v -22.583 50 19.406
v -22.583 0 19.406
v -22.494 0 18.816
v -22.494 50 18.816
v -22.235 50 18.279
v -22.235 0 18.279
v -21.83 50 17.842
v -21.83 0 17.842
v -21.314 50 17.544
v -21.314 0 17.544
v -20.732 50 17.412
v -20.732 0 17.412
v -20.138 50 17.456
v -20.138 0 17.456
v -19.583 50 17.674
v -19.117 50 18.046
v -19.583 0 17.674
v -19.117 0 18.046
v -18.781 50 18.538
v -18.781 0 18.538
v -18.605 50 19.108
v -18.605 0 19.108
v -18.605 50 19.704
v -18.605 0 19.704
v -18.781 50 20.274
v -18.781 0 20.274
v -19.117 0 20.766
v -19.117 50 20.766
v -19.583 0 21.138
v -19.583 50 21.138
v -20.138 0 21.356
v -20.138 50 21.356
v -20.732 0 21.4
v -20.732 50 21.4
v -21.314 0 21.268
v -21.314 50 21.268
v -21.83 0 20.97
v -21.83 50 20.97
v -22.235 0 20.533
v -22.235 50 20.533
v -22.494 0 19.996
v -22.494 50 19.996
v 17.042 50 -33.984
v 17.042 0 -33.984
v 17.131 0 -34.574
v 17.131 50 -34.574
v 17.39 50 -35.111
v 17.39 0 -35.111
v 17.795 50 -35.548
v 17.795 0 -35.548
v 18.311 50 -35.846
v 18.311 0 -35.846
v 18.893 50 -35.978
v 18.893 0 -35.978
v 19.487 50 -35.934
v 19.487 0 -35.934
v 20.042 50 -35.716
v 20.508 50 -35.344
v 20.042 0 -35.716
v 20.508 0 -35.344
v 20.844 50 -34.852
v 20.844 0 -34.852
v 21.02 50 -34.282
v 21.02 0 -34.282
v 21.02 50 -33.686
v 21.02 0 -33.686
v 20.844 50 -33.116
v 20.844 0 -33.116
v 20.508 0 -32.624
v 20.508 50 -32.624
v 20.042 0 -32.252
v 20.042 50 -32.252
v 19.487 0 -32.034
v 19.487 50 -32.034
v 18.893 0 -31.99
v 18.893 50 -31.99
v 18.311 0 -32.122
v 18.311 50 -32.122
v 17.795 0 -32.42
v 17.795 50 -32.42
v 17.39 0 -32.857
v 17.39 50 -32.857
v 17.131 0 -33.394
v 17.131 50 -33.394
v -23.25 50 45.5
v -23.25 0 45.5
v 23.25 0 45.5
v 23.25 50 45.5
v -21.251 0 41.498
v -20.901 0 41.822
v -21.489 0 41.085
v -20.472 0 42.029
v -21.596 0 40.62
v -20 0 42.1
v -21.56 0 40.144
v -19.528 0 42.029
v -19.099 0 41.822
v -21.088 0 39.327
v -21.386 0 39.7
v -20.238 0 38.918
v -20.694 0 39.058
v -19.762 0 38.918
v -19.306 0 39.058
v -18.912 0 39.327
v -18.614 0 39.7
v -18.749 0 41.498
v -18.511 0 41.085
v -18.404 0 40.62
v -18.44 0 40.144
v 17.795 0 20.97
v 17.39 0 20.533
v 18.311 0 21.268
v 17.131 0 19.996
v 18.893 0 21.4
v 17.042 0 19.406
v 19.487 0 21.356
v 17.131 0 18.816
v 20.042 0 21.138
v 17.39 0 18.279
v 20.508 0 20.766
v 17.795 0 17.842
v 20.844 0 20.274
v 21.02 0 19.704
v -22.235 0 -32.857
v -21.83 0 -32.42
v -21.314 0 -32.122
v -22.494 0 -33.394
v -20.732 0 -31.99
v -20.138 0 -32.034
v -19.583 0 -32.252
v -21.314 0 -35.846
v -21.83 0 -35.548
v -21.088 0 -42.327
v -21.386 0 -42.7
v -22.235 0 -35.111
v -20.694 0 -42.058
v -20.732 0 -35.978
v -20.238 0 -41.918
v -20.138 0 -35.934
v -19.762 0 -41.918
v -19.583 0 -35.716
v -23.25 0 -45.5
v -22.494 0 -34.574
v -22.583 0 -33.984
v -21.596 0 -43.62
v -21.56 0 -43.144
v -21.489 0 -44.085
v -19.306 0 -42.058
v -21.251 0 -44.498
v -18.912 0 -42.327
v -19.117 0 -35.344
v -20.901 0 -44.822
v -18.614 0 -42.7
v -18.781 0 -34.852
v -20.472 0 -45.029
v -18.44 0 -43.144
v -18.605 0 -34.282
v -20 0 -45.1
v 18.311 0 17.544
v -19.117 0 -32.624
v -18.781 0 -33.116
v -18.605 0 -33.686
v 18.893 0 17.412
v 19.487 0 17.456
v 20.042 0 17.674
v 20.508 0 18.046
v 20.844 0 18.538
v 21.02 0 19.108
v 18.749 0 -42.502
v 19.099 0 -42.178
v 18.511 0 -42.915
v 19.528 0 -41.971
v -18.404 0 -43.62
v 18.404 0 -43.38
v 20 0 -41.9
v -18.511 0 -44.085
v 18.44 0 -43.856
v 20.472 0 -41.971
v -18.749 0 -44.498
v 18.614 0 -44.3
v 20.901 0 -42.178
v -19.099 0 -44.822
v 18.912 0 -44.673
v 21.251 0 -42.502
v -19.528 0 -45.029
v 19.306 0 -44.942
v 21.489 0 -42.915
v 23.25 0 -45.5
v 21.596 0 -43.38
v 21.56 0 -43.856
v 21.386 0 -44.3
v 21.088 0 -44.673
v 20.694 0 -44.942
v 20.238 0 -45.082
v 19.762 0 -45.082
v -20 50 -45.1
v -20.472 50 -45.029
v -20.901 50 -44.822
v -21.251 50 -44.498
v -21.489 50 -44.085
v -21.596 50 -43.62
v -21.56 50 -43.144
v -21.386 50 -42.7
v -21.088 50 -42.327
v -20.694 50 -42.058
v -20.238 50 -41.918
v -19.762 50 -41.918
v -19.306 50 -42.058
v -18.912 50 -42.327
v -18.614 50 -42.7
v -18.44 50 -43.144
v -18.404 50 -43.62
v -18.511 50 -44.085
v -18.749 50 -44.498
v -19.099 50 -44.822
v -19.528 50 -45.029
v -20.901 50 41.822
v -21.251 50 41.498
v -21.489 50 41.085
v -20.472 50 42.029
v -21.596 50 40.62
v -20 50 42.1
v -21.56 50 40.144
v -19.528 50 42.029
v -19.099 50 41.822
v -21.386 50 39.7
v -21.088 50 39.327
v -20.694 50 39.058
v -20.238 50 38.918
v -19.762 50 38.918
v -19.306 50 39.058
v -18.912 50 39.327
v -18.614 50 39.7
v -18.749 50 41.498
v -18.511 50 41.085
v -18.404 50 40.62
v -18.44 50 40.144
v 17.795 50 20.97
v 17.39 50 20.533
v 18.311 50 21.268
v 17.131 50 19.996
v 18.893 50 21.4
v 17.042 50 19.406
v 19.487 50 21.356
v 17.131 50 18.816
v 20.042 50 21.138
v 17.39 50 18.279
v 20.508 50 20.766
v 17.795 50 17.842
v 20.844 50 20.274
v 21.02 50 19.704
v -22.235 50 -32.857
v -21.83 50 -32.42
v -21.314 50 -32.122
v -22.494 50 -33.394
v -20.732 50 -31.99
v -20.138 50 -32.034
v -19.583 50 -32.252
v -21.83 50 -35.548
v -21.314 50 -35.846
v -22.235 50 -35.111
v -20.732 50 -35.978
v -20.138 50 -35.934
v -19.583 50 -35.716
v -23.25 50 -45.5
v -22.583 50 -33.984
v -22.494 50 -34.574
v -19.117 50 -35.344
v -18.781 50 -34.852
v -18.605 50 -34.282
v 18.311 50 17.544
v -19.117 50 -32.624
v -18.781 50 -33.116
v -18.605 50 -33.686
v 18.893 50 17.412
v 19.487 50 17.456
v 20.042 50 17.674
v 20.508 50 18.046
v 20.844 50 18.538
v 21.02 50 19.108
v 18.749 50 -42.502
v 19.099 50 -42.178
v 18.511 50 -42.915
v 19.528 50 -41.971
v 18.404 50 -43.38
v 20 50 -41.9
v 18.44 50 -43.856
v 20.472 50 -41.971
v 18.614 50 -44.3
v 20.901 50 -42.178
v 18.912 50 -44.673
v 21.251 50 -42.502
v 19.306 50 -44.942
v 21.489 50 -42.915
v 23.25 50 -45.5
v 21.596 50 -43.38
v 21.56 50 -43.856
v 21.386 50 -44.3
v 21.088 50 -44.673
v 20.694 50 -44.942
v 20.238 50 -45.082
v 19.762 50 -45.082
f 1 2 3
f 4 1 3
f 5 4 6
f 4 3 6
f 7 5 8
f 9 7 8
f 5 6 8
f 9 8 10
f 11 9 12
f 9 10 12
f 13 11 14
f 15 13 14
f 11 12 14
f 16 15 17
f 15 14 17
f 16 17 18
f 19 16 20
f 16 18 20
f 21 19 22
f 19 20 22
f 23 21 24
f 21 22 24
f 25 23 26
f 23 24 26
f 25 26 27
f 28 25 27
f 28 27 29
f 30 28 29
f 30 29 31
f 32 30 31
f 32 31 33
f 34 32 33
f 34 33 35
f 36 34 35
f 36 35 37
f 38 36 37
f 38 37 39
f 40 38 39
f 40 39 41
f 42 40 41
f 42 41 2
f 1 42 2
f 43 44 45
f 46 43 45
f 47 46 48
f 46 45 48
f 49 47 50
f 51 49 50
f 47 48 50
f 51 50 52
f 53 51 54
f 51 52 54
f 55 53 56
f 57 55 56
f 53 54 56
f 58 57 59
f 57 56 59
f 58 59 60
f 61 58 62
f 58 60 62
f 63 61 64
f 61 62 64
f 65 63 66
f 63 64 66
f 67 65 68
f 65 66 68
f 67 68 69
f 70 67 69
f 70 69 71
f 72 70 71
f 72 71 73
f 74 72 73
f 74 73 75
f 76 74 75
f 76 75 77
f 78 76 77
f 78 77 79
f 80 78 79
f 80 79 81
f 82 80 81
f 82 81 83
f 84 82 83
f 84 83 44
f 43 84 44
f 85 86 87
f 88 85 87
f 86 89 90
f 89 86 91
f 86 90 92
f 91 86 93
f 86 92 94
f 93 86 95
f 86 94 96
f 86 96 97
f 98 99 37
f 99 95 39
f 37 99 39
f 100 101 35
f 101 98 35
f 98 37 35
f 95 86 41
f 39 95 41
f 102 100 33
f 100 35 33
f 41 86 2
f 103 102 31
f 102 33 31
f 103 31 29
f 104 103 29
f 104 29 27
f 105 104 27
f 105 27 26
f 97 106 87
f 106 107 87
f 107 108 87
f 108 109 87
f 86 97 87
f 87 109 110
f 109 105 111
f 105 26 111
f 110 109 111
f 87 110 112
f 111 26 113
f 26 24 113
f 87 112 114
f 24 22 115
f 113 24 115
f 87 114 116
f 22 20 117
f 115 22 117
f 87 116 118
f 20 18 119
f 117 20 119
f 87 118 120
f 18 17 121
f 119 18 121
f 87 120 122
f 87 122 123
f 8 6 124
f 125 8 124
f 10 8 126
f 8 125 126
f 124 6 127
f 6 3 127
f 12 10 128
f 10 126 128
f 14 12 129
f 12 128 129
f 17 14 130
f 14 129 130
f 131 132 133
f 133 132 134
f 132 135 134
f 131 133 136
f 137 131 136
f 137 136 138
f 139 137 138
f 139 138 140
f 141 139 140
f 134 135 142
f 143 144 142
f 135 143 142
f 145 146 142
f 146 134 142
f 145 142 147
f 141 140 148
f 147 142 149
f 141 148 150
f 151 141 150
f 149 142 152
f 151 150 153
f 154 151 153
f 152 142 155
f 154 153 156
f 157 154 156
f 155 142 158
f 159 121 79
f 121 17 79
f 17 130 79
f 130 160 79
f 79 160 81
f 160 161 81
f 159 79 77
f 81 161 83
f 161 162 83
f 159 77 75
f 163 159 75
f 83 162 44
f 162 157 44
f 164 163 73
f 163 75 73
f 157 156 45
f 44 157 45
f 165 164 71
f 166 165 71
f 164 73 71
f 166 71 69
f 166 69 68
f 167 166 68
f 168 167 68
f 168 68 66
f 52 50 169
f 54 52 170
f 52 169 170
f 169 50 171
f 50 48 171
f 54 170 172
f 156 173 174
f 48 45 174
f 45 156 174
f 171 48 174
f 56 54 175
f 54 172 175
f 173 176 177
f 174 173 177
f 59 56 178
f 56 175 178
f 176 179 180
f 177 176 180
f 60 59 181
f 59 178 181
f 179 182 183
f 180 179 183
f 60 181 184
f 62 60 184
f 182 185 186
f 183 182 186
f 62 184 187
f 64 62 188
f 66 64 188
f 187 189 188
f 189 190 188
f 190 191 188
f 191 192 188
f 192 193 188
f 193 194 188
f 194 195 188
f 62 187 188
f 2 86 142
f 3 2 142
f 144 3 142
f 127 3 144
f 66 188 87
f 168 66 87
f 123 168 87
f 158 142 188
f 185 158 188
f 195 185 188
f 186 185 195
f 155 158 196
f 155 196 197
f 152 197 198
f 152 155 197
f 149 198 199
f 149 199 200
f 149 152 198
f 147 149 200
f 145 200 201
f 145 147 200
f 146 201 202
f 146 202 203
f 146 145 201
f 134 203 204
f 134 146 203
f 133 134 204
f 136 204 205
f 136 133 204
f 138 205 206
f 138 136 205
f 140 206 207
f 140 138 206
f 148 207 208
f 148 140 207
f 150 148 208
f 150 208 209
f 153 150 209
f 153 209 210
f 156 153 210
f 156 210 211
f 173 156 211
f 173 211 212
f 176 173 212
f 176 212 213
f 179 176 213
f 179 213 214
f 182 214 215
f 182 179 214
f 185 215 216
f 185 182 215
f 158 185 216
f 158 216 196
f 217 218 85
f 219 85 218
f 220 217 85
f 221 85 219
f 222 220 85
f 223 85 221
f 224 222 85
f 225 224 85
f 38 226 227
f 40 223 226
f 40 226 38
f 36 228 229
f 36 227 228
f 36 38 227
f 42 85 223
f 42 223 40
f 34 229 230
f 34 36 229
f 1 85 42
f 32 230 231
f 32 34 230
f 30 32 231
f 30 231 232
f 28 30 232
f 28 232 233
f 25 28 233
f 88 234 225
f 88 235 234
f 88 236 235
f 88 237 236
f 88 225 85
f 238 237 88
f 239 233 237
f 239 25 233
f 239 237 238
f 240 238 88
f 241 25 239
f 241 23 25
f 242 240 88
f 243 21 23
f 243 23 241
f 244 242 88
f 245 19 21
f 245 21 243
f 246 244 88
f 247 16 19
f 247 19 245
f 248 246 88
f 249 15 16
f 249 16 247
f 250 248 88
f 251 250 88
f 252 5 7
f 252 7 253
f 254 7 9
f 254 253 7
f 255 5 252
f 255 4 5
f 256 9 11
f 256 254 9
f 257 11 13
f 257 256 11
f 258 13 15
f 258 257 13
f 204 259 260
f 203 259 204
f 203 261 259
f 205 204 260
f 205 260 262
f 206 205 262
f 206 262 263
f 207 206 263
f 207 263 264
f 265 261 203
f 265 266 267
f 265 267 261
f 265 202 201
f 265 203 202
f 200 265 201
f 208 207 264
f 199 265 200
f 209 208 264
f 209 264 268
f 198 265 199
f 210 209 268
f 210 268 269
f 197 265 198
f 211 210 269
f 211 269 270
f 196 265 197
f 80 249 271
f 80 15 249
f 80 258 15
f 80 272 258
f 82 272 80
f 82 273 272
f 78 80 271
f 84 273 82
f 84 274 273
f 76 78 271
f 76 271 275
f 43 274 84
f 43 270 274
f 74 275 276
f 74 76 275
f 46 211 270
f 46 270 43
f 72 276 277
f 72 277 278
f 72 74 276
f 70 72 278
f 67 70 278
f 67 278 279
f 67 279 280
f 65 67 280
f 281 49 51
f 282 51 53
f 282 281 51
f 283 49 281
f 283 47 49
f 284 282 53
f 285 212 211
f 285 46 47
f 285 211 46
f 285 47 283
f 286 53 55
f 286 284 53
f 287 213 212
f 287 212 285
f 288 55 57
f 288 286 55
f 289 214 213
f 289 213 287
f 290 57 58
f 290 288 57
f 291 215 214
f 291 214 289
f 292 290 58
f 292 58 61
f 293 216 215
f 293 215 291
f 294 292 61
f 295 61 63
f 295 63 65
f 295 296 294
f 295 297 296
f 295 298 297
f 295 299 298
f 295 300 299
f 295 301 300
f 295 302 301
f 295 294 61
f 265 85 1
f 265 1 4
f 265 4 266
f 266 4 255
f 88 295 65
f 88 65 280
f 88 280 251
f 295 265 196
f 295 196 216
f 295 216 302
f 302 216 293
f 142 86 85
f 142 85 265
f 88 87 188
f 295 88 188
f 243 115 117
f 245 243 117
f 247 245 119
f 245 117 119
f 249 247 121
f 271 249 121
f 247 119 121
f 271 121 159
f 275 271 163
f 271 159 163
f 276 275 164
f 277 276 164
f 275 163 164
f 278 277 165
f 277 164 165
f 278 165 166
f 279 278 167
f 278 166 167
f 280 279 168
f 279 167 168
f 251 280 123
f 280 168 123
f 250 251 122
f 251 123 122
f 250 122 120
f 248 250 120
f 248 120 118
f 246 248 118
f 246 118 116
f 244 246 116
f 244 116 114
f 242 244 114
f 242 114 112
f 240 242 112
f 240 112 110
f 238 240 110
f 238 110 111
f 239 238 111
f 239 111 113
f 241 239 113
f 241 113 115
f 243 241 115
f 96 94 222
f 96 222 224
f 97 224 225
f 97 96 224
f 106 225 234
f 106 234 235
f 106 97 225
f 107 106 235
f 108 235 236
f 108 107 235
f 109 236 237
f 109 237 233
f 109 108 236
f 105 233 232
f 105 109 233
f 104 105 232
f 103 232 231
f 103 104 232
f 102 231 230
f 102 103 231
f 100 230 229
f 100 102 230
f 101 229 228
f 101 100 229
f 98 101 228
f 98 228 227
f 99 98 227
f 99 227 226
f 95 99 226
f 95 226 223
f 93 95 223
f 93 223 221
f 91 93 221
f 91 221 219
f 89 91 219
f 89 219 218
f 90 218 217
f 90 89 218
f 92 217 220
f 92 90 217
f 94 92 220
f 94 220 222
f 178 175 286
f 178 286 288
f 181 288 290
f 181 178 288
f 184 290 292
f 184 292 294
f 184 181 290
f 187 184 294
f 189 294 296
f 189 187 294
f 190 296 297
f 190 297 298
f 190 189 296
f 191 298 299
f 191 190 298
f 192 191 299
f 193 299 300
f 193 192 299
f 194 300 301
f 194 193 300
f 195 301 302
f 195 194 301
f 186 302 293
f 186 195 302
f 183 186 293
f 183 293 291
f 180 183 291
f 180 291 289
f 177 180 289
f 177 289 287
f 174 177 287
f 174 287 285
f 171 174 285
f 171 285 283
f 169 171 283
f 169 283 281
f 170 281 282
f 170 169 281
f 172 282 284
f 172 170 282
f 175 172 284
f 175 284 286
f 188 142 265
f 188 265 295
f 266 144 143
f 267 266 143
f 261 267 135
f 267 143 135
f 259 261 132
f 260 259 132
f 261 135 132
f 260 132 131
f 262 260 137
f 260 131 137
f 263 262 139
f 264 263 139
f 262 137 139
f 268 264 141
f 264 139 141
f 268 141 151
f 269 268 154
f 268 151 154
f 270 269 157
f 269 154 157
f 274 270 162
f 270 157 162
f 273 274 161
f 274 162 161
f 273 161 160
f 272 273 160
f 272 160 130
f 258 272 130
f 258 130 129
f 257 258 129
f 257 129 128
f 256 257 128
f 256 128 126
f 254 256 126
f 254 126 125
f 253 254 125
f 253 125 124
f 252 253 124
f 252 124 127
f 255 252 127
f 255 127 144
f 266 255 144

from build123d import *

# Parameters (mm, degrees)
SKETCH_1_W          = 46.5
SKETCH_1_H          = 91
SKETCH_1_R          = 1.6
EXTRUDE_1_DEPTH     = 50
HOLE_WIZARD_1_D     = 4
HOLE_WIZARD_2_D     = 4
HOLE_WIZARD_2_DEPTH = 100


with BuildPart() as part:
    # 草图1 → 凸台-拉伸1 (new body)
    with BuildSketch(Plane(origin=(0, 0, 0), x_dir=(1, 0, 0), z_dir=(0, 1, 0))):
        Rectangle(SKETCH_1_W, SKETCH_1_H)
        with Locations(Location((20, 43.5, 0), (0, 0, 270))):
            Circle(SKETCH_1_R, mode=Mode.SUBTRACT)
        with Locations(Location((-20, 43.5, 0), (0, 0, 90))):
            Circle(SKETCH_1_R, mode=Mode.SUBTRACT)
        with Locations(Location((-20, -40.5, 0), (0, 0, 270))):
            Circle(SKETCH_1_R, mode=Mode.SUBTRACT)
    extrude(amount=EXTRUDE_1_DEPTH)

    # 孔1 (through all)
    with Locations(Plane(origin=(0, 50, 0), x_dir=(1, 0, 0), z_dir=(0, 1, 0))):
        with Locations((19.042, -19.406)):
            Hole(HOLE_WIZARD_1_D / 2)

    # 孔2
    with Locations(Plane(origin=(0, 50, 0), x_dir=(1, 0, 0), z_dir=(0, 1, 0))):
        with Locations((19.042, 33.984), (-20.583, 33.984), (-20.583, -19.406)):
            Hole(HOLE_WIZARD_2_D / 2, depth=HOLE_WIZARD_2_DEPTH)


solid = part.part
